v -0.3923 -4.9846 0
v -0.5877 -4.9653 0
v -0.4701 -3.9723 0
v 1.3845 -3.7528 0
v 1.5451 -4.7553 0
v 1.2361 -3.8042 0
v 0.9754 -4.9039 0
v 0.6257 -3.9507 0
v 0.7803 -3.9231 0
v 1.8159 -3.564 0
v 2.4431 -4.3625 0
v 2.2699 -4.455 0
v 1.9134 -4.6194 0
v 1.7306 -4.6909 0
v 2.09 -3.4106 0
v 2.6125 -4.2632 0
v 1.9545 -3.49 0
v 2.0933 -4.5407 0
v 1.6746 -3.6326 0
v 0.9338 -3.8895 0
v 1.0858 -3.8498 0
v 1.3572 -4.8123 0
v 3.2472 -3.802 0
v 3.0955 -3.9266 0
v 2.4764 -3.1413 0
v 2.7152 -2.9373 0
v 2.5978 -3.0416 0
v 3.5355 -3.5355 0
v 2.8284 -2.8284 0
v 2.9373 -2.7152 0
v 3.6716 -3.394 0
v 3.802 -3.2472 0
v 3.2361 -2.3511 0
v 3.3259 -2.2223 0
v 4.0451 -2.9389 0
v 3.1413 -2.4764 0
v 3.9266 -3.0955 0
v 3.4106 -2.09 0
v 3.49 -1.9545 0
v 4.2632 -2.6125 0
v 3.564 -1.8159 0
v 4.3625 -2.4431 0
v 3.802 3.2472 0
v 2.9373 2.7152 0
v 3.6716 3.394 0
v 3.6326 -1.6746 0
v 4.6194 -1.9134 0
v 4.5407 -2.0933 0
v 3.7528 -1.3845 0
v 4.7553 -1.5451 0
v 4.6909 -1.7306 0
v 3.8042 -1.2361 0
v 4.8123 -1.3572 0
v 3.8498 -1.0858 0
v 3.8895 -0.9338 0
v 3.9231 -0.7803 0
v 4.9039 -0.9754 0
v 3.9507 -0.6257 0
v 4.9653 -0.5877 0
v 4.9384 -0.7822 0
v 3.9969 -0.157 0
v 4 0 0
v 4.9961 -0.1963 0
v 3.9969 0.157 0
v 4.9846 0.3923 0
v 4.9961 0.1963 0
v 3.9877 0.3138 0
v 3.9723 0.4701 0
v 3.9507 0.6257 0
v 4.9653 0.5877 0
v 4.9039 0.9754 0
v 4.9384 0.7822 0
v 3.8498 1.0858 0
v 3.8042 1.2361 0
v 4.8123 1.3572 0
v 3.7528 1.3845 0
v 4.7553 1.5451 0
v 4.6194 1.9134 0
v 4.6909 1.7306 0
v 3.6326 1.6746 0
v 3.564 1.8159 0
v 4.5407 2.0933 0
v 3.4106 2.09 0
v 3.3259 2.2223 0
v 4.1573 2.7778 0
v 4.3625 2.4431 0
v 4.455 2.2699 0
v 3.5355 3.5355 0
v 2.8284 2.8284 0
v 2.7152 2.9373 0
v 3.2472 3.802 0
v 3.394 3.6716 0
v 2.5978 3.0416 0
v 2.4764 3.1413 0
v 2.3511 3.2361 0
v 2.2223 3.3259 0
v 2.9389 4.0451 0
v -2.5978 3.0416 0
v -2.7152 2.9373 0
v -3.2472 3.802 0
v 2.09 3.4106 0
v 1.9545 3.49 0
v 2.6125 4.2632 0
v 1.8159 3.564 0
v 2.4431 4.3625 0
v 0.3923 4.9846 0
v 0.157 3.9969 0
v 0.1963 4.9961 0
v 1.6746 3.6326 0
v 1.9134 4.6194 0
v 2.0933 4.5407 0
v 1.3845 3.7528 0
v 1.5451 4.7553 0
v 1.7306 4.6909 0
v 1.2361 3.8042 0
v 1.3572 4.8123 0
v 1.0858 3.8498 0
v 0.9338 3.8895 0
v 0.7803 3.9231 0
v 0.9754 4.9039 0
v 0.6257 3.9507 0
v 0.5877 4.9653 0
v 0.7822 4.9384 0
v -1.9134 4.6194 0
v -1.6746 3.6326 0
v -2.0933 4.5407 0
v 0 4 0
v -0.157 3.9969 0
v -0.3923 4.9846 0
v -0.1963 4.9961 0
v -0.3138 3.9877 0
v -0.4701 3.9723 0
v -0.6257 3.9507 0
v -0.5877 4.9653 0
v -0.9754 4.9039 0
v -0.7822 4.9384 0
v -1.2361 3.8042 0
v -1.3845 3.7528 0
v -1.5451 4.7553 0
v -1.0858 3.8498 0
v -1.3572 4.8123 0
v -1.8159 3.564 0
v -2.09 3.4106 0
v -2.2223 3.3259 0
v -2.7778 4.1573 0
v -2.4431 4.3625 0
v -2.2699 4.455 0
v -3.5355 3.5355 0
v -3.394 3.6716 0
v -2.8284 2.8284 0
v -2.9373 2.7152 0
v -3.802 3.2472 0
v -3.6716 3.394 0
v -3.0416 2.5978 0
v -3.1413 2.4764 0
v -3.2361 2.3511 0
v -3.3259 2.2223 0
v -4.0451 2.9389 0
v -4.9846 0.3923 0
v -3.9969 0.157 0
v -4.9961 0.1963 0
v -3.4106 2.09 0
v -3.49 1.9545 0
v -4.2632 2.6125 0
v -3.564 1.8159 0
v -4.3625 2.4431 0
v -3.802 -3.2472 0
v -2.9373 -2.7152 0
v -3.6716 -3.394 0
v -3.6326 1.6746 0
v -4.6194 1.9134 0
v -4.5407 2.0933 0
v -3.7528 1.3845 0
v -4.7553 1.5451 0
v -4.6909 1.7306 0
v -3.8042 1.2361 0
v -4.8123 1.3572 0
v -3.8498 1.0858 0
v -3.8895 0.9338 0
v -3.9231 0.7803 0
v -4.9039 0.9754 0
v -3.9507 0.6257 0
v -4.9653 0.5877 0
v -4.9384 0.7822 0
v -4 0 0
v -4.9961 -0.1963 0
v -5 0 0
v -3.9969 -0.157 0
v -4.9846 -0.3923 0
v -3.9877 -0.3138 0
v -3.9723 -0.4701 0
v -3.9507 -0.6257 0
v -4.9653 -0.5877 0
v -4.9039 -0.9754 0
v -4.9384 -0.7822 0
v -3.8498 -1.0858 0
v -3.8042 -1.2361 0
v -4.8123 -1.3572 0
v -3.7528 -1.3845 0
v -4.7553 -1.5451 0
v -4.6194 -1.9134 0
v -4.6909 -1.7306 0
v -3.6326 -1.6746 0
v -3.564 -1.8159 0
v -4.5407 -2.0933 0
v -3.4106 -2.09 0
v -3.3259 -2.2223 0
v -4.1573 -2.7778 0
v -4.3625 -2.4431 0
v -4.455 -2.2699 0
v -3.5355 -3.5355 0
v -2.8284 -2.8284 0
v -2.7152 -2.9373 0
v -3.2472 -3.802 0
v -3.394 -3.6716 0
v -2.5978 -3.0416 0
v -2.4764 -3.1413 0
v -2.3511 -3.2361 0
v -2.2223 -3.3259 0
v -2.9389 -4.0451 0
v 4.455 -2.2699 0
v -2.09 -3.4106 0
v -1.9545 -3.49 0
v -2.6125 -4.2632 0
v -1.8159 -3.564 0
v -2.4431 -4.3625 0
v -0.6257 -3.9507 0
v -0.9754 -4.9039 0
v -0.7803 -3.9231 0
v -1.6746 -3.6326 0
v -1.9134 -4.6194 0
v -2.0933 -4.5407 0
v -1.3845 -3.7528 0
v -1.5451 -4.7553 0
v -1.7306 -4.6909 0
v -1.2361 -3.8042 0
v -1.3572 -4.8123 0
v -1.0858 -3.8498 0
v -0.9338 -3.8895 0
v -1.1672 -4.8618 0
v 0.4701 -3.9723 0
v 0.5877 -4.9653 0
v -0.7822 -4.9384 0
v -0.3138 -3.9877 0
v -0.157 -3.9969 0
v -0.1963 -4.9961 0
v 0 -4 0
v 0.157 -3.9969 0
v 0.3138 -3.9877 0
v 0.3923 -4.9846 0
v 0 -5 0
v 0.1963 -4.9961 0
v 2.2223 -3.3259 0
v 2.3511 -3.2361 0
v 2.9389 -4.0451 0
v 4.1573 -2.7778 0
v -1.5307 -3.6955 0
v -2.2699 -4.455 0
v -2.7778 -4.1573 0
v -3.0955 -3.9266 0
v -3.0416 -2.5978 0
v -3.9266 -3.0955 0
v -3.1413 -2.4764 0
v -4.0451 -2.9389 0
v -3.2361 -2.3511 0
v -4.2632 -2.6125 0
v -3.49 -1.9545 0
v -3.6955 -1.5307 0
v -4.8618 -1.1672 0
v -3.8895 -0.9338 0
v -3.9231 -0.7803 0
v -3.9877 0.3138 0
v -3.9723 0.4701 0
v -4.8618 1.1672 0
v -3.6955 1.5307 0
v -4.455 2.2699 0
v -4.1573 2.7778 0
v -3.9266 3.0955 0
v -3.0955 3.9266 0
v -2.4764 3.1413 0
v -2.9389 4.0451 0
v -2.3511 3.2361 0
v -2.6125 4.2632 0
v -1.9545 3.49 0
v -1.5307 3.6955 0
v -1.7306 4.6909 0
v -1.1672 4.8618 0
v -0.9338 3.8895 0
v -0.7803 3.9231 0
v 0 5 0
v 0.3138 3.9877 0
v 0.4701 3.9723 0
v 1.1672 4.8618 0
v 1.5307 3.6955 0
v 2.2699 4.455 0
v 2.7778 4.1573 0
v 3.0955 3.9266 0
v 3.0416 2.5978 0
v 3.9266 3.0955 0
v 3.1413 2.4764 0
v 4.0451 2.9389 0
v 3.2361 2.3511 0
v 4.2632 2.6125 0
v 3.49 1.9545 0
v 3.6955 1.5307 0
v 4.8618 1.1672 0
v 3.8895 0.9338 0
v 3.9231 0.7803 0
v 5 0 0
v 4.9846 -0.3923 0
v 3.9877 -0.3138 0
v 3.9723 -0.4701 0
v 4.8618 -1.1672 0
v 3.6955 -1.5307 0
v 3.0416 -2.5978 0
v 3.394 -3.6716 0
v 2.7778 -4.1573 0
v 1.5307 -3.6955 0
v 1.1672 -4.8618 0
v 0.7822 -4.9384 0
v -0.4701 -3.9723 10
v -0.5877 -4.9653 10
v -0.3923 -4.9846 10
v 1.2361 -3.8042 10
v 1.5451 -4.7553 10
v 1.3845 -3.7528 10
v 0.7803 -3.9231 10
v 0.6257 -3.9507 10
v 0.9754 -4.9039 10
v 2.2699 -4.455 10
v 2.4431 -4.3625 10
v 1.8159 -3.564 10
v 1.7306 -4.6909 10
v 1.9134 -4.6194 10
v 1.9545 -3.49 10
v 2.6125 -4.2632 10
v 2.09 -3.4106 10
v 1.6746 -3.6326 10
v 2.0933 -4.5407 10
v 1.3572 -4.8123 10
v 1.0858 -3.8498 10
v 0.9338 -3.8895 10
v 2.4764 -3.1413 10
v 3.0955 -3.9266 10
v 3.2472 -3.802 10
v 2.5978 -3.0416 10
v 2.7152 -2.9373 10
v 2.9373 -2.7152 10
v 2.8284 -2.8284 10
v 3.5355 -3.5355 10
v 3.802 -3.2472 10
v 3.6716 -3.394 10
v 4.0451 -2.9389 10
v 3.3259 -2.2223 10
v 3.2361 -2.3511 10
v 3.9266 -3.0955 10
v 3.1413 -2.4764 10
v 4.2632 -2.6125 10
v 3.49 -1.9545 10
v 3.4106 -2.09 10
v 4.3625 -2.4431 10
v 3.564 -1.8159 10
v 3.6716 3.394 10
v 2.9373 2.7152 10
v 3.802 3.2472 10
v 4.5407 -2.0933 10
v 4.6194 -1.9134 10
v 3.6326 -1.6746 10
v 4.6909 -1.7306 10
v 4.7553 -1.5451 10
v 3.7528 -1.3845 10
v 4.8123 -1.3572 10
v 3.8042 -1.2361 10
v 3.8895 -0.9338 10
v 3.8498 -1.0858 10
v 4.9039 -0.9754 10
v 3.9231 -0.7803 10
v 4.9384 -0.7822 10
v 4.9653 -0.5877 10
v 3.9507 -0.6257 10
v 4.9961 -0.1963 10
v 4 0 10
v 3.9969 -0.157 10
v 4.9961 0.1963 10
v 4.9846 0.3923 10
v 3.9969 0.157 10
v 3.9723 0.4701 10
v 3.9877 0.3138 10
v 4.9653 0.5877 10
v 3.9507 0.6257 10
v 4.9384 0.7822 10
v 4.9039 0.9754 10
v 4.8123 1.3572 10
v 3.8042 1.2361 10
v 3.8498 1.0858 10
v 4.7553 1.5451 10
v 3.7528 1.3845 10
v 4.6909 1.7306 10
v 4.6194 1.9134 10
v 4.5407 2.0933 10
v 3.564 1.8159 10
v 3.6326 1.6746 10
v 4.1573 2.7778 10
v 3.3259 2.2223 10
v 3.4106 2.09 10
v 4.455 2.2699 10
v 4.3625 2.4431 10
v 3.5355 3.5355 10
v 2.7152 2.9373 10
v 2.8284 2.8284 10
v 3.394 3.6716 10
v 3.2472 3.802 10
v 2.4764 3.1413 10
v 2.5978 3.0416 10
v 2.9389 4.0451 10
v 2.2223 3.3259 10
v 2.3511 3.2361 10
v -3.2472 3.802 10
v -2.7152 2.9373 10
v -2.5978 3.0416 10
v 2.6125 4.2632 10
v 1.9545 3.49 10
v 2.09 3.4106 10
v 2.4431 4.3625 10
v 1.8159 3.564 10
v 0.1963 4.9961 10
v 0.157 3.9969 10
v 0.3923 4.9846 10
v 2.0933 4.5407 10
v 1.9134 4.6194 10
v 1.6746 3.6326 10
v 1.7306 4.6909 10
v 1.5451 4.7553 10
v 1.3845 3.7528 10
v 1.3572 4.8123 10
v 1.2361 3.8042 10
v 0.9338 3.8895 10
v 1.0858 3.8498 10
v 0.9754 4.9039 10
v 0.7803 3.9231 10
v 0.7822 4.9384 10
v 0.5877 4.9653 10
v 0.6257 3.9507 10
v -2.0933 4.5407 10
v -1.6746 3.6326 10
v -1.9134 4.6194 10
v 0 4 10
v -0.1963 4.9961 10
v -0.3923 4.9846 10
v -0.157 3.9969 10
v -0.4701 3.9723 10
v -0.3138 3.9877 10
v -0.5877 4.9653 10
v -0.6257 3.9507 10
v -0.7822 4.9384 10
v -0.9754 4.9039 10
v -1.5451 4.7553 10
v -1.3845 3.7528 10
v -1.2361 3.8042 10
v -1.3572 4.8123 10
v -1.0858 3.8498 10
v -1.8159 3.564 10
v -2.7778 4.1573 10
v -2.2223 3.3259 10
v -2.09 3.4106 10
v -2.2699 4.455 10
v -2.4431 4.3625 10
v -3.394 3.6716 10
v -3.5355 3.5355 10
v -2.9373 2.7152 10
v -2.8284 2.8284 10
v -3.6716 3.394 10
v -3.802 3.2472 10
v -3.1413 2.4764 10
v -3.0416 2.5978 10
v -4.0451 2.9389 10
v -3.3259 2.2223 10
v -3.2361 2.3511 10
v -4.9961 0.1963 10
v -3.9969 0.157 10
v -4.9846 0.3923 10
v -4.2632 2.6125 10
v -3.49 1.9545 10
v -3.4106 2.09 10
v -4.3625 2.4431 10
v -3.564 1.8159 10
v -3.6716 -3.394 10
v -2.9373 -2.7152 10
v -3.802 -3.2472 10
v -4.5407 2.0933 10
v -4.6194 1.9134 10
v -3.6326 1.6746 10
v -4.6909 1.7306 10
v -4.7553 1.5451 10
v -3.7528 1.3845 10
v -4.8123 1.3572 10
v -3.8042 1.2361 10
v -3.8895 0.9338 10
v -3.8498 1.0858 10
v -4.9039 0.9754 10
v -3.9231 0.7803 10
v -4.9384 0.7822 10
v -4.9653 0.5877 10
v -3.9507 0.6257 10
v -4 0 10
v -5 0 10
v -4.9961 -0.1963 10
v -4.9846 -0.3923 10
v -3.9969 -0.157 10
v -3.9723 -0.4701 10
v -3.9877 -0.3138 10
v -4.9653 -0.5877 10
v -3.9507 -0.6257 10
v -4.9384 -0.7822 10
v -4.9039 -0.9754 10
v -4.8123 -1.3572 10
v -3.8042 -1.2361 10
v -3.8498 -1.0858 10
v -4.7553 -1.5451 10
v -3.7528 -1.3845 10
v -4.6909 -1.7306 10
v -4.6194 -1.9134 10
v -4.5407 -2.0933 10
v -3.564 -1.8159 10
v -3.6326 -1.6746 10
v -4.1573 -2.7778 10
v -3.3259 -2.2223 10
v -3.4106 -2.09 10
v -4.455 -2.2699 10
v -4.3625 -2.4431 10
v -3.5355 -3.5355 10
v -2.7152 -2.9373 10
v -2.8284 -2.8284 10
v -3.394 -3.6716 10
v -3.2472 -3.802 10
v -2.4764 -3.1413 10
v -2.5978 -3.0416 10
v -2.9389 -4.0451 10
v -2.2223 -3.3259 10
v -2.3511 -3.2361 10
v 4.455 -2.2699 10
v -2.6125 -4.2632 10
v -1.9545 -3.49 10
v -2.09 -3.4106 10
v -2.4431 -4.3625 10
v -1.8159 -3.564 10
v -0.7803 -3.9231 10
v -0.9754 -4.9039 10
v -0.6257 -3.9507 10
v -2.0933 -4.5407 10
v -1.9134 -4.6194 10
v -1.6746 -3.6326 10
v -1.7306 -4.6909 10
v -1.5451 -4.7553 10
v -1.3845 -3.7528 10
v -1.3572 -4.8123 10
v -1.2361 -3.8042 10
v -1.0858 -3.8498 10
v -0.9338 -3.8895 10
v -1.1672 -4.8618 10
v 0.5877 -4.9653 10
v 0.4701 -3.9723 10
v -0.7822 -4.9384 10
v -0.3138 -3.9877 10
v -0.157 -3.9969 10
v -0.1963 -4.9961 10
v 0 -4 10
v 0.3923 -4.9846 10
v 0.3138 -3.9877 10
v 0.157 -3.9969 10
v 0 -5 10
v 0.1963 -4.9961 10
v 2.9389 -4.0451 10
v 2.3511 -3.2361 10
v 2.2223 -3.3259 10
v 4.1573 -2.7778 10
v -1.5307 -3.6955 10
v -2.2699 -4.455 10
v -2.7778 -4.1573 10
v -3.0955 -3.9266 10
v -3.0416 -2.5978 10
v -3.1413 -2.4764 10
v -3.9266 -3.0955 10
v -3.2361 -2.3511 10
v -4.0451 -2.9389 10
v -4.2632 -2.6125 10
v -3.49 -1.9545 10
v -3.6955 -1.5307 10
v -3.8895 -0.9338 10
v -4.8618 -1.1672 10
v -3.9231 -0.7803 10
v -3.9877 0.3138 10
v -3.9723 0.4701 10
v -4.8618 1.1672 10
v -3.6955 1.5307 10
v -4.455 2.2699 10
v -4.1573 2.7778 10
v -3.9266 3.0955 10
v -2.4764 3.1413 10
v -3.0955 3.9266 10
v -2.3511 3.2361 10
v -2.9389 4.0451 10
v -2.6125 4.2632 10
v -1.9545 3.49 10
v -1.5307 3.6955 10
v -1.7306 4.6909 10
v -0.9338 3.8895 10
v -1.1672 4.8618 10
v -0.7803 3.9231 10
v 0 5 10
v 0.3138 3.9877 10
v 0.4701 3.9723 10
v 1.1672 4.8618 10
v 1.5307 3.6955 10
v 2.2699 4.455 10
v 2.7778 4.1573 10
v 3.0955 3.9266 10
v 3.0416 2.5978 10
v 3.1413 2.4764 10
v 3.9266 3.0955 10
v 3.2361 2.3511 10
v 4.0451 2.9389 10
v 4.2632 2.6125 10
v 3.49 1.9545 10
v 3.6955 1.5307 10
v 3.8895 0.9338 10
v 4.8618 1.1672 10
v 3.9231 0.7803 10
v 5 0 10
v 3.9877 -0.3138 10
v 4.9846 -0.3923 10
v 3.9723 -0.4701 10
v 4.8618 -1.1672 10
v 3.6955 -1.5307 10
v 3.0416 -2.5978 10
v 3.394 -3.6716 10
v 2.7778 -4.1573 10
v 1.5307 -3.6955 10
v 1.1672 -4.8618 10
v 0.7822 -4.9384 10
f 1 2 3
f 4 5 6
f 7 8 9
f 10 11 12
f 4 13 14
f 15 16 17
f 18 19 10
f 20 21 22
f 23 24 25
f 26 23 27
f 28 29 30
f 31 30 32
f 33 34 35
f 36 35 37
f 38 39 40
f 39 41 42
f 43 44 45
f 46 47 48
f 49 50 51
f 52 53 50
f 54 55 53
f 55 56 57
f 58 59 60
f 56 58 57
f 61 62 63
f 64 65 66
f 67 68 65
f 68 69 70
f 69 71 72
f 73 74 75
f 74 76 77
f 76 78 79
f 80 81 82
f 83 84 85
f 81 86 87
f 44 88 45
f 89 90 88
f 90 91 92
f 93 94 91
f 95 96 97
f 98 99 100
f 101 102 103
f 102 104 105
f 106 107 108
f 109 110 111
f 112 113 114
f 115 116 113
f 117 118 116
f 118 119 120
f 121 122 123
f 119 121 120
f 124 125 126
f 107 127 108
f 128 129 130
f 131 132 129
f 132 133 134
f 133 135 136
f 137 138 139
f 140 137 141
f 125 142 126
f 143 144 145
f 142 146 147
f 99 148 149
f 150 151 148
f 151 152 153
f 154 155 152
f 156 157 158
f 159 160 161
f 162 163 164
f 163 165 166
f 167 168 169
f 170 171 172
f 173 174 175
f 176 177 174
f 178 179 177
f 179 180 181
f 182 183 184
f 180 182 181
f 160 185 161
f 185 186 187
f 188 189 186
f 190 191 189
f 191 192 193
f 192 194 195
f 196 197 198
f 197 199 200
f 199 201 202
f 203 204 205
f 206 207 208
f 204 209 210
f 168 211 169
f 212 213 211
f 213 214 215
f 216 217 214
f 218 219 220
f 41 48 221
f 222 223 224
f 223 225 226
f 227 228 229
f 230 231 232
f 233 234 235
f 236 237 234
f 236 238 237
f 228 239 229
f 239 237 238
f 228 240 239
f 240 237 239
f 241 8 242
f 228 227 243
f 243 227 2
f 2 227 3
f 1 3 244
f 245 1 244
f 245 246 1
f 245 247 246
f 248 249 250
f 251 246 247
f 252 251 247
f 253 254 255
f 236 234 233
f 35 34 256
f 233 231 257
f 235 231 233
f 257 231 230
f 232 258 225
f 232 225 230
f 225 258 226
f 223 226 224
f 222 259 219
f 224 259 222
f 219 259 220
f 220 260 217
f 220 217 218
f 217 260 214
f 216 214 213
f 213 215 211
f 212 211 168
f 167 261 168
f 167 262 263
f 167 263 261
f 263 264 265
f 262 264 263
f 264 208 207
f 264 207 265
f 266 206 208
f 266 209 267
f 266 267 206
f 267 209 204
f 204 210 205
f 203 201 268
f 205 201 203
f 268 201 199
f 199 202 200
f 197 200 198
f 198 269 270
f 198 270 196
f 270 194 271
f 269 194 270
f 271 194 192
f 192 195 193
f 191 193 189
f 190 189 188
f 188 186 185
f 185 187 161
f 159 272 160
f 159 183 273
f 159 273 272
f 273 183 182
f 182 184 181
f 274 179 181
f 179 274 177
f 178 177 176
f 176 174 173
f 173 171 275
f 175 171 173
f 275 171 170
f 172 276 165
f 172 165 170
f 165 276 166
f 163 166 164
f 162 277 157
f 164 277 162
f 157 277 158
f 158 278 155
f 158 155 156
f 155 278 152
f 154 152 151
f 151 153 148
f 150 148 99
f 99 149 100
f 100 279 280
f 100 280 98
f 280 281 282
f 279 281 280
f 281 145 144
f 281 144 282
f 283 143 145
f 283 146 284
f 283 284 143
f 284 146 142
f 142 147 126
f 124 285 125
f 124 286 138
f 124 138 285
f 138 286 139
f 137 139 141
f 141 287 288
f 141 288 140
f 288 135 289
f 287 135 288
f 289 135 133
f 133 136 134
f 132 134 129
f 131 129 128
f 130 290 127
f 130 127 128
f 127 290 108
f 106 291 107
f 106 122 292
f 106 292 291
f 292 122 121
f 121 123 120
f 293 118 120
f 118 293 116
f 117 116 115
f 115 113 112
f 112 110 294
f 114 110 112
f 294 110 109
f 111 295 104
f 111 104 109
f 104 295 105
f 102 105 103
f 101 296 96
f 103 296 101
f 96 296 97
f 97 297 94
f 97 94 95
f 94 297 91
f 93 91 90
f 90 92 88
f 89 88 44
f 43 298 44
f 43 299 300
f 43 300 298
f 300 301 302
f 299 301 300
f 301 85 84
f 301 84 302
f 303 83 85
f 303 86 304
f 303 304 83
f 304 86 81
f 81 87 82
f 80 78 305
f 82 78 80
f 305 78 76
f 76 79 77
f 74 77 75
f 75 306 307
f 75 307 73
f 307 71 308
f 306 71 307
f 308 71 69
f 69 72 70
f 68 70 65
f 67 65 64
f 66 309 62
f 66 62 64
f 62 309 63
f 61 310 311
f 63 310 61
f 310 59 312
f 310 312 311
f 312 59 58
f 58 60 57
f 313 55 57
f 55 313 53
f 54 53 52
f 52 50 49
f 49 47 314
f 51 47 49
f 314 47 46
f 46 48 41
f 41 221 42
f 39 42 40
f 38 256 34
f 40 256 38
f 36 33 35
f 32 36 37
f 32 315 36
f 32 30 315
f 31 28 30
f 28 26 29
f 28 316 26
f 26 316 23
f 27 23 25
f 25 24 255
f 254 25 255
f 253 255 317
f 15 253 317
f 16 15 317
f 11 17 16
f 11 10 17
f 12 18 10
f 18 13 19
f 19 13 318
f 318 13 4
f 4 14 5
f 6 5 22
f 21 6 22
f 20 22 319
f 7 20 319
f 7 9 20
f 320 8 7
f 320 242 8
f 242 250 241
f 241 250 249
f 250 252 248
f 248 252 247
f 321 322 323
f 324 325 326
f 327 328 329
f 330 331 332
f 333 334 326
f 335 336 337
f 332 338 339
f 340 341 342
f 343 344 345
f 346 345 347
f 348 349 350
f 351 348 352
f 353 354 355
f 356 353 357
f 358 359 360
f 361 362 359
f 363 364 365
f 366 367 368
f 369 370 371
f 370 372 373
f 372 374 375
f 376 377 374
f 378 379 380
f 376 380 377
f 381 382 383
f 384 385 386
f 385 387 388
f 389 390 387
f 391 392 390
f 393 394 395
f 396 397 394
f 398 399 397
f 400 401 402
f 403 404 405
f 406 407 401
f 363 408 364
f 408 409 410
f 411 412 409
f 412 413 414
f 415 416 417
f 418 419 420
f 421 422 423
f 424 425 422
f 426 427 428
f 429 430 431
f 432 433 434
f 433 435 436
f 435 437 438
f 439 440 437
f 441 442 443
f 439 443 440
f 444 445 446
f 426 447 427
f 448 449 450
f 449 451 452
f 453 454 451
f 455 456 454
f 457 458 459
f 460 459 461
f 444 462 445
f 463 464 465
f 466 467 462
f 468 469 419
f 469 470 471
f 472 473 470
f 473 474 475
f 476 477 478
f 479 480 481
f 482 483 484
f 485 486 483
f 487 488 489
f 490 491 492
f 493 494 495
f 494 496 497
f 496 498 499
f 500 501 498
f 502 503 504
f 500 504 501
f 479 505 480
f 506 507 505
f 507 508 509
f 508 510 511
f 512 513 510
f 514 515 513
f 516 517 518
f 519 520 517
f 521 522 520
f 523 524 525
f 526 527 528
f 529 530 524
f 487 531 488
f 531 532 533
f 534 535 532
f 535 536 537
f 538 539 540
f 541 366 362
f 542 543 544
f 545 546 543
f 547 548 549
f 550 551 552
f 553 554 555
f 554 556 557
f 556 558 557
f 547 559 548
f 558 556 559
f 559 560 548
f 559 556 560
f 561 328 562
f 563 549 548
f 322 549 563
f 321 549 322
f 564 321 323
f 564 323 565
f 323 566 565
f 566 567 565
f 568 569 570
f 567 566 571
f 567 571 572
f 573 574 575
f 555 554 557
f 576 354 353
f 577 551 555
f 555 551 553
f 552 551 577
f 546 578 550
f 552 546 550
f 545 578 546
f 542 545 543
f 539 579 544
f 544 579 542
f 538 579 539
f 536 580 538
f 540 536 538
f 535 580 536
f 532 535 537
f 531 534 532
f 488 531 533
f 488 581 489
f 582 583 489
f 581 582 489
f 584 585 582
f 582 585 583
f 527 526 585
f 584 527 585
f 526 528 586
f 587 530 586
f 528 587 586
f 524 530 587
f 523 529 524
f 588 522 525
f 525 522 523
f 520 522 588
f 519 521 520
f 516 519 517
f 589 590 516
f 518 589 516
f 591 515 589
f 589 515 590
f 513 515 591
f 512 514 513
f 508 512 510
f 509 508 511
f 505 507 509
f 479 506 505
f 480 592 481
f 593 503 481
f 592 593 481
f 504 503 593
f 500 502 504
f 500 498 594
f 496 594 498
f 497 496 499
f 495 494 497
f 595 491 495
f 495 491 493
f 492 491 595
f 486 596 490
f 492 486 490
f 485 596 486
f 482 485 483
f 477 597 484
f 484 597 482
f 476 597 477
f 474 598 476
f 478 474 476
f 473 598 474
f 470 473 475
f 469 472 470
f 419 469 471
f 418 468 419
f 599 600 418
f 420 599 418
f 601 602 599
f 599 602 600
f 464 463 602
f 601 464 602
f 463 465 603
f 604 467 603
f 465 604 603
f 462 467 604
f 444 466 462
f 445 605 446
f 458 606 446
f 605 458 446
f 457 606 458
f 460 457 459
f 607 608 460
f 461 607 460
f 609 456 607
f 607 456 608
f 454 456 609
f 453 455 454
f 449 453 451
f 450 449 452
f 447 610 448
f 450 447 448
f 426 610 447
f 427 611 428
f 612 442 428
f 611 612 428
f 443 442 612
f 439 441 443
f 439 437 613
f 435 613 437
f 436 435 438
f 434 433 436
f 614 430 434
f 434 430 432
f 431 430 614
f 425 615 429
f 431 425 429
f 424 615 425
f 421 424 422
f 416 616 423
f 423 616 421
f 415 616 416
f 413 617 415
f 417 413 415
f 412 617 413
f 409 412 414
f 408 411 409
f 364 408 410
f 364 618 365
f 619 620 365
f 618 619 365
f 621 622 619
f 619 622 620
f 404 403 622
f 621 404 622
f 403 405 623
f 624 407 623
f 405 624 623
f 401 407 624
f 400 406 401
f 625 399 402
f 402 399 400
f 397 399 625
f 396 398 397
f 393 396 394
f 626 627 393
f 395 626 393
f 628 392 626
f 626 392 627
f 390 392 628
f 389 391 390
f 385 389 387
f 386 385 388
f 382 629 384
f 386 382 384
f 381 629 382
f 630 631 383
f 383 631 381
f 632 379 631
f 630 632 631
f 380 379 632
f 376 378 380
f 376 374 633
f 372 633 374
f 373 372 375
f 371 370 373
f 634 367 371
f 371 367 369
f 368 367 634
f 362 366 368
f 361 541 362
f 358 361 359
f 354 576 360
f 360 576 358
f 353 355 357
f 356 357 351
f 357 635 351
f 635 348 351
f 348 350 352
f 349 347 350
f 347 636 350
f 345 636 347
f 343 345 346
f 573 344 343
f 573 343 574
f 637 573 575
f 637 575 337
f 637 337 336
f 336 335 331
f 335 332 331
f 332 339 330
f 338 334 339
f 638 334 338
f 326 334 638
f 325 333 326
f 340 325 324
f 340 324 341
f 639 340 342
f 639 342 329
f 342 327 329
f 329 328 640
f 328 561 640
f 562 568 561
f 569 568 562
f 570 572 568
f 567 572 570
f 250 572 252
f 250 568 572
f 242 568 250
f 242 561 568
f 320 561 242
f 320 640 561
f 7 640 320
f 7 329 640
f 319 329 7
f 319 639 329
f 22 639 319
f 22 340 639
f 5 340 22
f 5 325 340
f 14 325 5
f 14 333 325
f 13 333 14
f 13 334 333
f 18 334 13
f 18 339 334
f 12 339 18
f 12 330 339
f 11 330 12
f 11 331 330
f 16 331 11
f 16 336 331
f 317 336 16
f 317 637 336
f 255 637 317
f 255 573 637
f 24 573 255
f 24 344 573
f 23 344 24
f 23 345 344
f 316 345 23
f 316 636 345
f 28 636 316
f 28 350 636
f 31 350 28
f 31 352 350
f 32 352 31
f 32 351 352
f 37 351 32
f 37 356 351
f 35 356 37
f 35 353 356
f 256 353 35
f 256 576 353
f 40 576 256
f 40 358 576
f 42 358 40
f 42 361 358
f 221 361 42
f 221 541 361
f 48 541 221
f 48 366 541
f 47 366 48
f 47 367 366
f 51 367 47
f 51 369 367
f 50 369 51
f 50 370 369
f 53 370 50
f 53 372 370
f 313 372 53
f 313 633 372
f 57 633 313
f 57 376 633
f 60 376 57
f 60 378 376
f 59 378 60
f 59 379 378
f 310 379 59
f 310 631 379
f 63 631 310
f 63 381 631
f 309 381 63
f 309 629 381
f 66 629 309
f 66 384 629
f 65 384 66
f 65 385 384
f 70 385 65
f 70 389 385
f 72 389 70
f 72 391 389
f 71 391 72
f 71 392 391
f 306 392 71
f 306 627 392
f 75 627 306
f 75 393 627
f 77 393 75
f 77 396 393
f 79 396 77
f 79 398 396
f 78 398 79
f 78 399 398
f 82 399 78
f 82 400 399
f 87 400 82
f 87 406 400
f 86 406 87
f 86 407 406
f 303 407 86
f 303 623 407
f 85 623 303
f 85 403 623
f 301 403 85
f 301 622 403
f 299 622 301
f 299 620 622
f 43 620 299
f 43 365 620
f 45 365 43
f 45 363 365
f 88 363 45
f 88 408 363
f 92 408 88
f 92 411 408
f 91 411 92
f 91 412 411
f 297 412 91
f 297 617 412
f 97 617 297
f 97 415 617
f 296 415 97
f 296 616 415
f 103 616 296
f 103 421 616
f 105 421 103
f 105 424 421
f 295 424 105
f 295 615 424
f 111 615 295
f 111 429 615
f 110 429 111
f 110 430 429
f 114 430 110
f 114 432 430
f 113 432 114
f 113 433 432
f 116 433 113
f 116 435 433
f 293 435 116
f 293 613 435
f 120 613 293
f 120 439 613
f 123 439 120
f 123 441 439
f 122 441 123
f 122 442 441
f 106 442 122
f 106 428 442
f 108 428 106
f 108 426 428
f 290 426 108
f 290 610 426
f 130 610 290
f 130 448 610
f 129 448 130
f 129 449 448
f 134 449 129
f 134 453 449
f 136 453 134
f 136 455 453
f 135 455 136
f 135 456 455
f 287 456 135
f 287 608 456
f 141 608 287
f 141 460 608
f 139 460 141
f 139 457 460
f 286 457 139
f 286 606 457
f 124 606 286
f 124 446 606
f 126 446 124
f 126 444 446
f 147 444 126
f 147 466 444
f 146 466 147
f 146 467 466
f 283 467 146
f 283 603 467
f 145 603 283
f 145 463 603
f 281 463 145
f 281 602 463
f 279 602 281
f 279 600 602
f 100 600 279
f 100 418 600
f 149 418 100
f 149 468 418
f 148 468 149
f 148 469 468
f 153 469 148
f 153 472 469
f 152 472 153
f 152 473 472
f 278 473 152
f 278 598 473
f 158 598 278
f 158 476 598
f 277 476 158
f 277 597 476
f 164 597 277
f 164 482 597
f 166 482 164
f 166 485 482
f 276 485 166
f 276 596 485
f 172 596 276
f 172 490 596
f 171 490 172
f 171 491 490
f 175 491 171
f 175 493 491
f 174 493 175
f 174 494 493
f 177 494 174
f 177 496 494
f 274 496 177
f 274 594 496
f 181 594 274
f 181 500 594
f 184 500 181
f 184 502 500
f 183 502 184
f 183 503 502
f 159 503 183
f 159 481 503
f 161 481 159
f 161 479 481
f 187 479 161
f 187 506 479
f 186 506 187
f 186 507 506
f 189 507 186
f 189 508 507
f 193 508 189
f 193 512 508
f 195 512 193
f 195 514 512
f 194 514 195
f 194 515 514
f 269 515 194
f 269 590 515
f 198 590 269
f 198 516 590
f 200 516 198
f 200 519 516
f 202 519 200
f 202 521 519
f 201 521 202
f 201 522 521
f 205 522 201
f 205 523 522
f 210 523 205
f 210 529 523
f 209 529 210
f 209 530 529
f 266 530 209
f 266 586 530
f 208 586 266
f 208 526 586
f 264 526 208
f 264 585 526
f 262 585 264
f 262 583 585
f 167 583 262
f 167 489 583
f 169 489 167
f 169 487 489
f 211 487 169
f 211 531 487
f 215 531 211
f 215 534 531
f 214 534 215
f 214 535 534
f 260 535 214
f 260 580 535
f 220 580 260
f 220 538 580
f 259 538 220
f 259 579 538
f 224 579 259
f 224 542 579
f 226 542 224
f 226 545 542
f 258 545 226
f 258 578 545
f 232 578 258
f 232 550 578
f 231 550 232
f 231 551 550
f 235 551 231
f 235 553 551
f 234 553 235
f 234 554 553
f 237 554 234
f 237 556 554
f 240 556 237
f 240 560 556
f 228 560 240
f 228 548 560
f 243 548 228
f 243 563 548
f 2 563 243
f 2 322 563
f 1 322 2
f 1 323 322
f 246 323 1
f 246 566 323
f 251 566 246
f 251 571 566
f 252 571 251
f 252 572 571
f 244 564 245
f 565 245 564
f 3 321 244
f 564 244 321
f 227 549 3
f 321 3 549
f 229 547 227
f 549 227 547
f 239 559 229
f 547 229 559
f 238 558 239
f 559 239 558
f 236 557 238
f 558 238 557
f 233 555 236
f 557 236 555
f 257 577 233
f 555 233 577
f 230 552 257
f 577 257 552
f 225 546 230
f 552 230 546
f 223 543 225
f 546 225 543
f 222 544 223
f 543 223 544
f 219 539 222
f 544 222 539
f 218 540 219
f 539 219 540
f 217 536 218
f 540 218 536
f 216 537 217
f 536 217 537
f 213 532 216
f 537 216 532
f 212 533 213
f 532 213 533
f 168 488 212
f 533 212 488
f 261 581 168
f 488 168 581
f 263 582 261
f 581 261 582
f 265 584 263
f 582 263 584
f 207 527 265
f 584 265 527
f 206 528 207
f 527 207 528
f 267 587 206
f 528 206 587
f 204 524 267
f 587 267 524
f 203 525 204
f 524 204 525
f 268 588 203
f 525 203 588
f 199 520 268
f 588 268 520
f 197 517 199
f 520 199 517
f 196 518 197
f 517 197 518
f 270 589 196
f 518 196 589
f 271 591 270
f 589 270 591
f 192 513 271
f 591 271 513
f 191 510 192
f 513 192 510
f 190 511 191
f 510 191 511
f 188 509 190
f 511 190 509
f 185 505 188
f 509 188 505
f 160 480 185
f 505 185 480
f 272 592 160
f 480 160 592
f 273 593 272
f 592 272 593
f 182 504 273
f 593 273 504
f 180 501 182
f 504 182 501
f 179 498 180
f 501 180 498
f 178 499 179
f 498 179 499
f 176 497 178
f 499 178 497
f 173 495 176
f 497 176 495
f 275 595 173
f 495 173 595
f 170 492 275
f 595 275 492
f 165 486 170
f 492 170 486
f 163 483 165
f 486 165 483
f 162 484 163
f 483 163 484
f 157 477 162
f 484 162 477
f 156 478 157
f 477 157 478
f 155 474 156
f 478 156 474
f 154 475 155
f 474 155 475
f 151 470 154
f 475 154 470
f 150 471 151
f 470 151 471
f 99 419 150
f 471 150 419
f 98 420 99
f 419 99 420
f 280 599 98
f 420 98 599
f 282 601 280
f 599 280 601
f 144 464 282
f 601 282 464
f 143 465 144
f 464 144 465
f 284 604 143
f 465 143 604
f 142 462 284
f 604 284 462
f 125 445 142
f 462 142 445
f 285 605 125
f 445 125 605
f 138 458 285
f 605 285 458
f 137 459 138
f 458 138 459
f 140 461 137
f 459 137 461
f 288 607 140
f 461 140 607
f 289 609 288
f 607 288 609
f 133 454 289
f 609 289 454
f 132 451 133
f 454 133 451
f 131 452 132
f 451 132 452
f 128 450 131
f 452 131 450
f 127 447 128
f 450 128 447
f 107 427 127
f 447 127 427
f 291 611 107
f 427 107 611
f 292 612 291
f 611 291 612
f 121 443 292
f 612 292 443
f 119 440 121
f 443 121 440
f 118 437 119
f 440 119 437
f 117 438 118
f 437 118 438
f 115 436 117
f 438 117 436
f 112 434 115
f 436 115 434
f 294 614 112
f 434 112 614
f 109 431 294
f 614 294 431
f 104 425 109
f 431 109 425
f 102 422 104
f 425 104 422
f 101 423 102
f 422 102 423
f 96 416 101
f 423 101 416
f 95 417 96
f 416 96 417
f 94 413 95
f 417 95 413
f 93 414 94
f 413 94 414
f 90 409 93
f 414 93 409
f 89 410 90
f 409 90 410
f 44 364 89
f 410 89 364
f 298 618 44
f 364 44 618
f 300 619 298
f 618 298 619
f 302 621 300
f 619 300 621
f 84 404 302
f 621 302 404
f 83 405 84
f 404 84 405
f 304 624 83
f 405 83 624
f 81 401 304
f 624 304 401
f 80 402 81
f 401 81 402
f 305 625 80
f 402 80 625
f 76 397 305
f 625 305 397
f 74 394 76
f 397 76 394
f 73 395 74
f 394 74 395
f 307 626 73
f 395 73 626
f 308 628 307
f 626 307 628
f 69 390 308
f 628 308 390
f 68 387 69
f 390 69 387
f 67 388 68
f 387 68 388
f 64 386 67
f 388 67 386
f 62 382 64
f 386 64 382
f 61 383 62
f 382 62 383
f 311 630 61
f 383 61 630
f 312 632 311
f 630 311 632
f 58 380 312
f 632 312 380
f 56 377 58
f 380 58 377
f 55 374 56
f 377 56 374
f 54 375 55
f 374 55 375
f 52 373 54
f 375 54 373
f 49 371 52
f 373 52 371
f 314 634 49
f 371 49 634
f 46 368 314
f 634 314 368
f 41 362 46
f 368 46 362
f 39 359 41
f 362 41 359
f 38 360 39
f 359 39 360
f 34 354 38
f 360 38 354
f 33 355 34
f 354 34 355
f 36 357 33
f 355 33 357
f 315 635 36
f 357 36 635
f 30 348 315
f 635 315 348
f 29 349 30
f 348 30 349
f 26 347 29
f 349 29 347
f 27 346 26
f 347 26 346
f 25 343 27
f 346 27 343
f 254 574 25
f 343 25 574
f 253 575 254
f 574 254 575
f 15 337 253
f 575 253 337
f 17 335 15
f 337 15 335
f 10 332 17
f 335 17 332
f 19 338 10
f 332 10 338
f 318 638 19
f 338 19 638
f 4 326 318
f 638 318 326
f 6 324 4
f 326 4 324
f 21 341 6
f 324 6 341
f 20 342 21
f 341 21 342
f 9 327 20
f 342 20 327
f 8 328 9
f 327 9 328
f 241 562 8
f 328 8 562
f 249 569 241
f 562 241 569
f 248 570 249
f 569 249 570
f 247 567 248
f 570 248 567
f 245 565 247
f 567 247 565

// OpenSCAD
diametre_ext = 10  ;
diametre_int = 8   ;
hauteur      = 10  ;
resolution = 160 ;


/* fin du parametrable  */
$fn=resolution  ;
linear_extrude ( height= hauteur ){
difference(){
circle (d=diametre_ext );
circle (d=diametre_int );
}
}
